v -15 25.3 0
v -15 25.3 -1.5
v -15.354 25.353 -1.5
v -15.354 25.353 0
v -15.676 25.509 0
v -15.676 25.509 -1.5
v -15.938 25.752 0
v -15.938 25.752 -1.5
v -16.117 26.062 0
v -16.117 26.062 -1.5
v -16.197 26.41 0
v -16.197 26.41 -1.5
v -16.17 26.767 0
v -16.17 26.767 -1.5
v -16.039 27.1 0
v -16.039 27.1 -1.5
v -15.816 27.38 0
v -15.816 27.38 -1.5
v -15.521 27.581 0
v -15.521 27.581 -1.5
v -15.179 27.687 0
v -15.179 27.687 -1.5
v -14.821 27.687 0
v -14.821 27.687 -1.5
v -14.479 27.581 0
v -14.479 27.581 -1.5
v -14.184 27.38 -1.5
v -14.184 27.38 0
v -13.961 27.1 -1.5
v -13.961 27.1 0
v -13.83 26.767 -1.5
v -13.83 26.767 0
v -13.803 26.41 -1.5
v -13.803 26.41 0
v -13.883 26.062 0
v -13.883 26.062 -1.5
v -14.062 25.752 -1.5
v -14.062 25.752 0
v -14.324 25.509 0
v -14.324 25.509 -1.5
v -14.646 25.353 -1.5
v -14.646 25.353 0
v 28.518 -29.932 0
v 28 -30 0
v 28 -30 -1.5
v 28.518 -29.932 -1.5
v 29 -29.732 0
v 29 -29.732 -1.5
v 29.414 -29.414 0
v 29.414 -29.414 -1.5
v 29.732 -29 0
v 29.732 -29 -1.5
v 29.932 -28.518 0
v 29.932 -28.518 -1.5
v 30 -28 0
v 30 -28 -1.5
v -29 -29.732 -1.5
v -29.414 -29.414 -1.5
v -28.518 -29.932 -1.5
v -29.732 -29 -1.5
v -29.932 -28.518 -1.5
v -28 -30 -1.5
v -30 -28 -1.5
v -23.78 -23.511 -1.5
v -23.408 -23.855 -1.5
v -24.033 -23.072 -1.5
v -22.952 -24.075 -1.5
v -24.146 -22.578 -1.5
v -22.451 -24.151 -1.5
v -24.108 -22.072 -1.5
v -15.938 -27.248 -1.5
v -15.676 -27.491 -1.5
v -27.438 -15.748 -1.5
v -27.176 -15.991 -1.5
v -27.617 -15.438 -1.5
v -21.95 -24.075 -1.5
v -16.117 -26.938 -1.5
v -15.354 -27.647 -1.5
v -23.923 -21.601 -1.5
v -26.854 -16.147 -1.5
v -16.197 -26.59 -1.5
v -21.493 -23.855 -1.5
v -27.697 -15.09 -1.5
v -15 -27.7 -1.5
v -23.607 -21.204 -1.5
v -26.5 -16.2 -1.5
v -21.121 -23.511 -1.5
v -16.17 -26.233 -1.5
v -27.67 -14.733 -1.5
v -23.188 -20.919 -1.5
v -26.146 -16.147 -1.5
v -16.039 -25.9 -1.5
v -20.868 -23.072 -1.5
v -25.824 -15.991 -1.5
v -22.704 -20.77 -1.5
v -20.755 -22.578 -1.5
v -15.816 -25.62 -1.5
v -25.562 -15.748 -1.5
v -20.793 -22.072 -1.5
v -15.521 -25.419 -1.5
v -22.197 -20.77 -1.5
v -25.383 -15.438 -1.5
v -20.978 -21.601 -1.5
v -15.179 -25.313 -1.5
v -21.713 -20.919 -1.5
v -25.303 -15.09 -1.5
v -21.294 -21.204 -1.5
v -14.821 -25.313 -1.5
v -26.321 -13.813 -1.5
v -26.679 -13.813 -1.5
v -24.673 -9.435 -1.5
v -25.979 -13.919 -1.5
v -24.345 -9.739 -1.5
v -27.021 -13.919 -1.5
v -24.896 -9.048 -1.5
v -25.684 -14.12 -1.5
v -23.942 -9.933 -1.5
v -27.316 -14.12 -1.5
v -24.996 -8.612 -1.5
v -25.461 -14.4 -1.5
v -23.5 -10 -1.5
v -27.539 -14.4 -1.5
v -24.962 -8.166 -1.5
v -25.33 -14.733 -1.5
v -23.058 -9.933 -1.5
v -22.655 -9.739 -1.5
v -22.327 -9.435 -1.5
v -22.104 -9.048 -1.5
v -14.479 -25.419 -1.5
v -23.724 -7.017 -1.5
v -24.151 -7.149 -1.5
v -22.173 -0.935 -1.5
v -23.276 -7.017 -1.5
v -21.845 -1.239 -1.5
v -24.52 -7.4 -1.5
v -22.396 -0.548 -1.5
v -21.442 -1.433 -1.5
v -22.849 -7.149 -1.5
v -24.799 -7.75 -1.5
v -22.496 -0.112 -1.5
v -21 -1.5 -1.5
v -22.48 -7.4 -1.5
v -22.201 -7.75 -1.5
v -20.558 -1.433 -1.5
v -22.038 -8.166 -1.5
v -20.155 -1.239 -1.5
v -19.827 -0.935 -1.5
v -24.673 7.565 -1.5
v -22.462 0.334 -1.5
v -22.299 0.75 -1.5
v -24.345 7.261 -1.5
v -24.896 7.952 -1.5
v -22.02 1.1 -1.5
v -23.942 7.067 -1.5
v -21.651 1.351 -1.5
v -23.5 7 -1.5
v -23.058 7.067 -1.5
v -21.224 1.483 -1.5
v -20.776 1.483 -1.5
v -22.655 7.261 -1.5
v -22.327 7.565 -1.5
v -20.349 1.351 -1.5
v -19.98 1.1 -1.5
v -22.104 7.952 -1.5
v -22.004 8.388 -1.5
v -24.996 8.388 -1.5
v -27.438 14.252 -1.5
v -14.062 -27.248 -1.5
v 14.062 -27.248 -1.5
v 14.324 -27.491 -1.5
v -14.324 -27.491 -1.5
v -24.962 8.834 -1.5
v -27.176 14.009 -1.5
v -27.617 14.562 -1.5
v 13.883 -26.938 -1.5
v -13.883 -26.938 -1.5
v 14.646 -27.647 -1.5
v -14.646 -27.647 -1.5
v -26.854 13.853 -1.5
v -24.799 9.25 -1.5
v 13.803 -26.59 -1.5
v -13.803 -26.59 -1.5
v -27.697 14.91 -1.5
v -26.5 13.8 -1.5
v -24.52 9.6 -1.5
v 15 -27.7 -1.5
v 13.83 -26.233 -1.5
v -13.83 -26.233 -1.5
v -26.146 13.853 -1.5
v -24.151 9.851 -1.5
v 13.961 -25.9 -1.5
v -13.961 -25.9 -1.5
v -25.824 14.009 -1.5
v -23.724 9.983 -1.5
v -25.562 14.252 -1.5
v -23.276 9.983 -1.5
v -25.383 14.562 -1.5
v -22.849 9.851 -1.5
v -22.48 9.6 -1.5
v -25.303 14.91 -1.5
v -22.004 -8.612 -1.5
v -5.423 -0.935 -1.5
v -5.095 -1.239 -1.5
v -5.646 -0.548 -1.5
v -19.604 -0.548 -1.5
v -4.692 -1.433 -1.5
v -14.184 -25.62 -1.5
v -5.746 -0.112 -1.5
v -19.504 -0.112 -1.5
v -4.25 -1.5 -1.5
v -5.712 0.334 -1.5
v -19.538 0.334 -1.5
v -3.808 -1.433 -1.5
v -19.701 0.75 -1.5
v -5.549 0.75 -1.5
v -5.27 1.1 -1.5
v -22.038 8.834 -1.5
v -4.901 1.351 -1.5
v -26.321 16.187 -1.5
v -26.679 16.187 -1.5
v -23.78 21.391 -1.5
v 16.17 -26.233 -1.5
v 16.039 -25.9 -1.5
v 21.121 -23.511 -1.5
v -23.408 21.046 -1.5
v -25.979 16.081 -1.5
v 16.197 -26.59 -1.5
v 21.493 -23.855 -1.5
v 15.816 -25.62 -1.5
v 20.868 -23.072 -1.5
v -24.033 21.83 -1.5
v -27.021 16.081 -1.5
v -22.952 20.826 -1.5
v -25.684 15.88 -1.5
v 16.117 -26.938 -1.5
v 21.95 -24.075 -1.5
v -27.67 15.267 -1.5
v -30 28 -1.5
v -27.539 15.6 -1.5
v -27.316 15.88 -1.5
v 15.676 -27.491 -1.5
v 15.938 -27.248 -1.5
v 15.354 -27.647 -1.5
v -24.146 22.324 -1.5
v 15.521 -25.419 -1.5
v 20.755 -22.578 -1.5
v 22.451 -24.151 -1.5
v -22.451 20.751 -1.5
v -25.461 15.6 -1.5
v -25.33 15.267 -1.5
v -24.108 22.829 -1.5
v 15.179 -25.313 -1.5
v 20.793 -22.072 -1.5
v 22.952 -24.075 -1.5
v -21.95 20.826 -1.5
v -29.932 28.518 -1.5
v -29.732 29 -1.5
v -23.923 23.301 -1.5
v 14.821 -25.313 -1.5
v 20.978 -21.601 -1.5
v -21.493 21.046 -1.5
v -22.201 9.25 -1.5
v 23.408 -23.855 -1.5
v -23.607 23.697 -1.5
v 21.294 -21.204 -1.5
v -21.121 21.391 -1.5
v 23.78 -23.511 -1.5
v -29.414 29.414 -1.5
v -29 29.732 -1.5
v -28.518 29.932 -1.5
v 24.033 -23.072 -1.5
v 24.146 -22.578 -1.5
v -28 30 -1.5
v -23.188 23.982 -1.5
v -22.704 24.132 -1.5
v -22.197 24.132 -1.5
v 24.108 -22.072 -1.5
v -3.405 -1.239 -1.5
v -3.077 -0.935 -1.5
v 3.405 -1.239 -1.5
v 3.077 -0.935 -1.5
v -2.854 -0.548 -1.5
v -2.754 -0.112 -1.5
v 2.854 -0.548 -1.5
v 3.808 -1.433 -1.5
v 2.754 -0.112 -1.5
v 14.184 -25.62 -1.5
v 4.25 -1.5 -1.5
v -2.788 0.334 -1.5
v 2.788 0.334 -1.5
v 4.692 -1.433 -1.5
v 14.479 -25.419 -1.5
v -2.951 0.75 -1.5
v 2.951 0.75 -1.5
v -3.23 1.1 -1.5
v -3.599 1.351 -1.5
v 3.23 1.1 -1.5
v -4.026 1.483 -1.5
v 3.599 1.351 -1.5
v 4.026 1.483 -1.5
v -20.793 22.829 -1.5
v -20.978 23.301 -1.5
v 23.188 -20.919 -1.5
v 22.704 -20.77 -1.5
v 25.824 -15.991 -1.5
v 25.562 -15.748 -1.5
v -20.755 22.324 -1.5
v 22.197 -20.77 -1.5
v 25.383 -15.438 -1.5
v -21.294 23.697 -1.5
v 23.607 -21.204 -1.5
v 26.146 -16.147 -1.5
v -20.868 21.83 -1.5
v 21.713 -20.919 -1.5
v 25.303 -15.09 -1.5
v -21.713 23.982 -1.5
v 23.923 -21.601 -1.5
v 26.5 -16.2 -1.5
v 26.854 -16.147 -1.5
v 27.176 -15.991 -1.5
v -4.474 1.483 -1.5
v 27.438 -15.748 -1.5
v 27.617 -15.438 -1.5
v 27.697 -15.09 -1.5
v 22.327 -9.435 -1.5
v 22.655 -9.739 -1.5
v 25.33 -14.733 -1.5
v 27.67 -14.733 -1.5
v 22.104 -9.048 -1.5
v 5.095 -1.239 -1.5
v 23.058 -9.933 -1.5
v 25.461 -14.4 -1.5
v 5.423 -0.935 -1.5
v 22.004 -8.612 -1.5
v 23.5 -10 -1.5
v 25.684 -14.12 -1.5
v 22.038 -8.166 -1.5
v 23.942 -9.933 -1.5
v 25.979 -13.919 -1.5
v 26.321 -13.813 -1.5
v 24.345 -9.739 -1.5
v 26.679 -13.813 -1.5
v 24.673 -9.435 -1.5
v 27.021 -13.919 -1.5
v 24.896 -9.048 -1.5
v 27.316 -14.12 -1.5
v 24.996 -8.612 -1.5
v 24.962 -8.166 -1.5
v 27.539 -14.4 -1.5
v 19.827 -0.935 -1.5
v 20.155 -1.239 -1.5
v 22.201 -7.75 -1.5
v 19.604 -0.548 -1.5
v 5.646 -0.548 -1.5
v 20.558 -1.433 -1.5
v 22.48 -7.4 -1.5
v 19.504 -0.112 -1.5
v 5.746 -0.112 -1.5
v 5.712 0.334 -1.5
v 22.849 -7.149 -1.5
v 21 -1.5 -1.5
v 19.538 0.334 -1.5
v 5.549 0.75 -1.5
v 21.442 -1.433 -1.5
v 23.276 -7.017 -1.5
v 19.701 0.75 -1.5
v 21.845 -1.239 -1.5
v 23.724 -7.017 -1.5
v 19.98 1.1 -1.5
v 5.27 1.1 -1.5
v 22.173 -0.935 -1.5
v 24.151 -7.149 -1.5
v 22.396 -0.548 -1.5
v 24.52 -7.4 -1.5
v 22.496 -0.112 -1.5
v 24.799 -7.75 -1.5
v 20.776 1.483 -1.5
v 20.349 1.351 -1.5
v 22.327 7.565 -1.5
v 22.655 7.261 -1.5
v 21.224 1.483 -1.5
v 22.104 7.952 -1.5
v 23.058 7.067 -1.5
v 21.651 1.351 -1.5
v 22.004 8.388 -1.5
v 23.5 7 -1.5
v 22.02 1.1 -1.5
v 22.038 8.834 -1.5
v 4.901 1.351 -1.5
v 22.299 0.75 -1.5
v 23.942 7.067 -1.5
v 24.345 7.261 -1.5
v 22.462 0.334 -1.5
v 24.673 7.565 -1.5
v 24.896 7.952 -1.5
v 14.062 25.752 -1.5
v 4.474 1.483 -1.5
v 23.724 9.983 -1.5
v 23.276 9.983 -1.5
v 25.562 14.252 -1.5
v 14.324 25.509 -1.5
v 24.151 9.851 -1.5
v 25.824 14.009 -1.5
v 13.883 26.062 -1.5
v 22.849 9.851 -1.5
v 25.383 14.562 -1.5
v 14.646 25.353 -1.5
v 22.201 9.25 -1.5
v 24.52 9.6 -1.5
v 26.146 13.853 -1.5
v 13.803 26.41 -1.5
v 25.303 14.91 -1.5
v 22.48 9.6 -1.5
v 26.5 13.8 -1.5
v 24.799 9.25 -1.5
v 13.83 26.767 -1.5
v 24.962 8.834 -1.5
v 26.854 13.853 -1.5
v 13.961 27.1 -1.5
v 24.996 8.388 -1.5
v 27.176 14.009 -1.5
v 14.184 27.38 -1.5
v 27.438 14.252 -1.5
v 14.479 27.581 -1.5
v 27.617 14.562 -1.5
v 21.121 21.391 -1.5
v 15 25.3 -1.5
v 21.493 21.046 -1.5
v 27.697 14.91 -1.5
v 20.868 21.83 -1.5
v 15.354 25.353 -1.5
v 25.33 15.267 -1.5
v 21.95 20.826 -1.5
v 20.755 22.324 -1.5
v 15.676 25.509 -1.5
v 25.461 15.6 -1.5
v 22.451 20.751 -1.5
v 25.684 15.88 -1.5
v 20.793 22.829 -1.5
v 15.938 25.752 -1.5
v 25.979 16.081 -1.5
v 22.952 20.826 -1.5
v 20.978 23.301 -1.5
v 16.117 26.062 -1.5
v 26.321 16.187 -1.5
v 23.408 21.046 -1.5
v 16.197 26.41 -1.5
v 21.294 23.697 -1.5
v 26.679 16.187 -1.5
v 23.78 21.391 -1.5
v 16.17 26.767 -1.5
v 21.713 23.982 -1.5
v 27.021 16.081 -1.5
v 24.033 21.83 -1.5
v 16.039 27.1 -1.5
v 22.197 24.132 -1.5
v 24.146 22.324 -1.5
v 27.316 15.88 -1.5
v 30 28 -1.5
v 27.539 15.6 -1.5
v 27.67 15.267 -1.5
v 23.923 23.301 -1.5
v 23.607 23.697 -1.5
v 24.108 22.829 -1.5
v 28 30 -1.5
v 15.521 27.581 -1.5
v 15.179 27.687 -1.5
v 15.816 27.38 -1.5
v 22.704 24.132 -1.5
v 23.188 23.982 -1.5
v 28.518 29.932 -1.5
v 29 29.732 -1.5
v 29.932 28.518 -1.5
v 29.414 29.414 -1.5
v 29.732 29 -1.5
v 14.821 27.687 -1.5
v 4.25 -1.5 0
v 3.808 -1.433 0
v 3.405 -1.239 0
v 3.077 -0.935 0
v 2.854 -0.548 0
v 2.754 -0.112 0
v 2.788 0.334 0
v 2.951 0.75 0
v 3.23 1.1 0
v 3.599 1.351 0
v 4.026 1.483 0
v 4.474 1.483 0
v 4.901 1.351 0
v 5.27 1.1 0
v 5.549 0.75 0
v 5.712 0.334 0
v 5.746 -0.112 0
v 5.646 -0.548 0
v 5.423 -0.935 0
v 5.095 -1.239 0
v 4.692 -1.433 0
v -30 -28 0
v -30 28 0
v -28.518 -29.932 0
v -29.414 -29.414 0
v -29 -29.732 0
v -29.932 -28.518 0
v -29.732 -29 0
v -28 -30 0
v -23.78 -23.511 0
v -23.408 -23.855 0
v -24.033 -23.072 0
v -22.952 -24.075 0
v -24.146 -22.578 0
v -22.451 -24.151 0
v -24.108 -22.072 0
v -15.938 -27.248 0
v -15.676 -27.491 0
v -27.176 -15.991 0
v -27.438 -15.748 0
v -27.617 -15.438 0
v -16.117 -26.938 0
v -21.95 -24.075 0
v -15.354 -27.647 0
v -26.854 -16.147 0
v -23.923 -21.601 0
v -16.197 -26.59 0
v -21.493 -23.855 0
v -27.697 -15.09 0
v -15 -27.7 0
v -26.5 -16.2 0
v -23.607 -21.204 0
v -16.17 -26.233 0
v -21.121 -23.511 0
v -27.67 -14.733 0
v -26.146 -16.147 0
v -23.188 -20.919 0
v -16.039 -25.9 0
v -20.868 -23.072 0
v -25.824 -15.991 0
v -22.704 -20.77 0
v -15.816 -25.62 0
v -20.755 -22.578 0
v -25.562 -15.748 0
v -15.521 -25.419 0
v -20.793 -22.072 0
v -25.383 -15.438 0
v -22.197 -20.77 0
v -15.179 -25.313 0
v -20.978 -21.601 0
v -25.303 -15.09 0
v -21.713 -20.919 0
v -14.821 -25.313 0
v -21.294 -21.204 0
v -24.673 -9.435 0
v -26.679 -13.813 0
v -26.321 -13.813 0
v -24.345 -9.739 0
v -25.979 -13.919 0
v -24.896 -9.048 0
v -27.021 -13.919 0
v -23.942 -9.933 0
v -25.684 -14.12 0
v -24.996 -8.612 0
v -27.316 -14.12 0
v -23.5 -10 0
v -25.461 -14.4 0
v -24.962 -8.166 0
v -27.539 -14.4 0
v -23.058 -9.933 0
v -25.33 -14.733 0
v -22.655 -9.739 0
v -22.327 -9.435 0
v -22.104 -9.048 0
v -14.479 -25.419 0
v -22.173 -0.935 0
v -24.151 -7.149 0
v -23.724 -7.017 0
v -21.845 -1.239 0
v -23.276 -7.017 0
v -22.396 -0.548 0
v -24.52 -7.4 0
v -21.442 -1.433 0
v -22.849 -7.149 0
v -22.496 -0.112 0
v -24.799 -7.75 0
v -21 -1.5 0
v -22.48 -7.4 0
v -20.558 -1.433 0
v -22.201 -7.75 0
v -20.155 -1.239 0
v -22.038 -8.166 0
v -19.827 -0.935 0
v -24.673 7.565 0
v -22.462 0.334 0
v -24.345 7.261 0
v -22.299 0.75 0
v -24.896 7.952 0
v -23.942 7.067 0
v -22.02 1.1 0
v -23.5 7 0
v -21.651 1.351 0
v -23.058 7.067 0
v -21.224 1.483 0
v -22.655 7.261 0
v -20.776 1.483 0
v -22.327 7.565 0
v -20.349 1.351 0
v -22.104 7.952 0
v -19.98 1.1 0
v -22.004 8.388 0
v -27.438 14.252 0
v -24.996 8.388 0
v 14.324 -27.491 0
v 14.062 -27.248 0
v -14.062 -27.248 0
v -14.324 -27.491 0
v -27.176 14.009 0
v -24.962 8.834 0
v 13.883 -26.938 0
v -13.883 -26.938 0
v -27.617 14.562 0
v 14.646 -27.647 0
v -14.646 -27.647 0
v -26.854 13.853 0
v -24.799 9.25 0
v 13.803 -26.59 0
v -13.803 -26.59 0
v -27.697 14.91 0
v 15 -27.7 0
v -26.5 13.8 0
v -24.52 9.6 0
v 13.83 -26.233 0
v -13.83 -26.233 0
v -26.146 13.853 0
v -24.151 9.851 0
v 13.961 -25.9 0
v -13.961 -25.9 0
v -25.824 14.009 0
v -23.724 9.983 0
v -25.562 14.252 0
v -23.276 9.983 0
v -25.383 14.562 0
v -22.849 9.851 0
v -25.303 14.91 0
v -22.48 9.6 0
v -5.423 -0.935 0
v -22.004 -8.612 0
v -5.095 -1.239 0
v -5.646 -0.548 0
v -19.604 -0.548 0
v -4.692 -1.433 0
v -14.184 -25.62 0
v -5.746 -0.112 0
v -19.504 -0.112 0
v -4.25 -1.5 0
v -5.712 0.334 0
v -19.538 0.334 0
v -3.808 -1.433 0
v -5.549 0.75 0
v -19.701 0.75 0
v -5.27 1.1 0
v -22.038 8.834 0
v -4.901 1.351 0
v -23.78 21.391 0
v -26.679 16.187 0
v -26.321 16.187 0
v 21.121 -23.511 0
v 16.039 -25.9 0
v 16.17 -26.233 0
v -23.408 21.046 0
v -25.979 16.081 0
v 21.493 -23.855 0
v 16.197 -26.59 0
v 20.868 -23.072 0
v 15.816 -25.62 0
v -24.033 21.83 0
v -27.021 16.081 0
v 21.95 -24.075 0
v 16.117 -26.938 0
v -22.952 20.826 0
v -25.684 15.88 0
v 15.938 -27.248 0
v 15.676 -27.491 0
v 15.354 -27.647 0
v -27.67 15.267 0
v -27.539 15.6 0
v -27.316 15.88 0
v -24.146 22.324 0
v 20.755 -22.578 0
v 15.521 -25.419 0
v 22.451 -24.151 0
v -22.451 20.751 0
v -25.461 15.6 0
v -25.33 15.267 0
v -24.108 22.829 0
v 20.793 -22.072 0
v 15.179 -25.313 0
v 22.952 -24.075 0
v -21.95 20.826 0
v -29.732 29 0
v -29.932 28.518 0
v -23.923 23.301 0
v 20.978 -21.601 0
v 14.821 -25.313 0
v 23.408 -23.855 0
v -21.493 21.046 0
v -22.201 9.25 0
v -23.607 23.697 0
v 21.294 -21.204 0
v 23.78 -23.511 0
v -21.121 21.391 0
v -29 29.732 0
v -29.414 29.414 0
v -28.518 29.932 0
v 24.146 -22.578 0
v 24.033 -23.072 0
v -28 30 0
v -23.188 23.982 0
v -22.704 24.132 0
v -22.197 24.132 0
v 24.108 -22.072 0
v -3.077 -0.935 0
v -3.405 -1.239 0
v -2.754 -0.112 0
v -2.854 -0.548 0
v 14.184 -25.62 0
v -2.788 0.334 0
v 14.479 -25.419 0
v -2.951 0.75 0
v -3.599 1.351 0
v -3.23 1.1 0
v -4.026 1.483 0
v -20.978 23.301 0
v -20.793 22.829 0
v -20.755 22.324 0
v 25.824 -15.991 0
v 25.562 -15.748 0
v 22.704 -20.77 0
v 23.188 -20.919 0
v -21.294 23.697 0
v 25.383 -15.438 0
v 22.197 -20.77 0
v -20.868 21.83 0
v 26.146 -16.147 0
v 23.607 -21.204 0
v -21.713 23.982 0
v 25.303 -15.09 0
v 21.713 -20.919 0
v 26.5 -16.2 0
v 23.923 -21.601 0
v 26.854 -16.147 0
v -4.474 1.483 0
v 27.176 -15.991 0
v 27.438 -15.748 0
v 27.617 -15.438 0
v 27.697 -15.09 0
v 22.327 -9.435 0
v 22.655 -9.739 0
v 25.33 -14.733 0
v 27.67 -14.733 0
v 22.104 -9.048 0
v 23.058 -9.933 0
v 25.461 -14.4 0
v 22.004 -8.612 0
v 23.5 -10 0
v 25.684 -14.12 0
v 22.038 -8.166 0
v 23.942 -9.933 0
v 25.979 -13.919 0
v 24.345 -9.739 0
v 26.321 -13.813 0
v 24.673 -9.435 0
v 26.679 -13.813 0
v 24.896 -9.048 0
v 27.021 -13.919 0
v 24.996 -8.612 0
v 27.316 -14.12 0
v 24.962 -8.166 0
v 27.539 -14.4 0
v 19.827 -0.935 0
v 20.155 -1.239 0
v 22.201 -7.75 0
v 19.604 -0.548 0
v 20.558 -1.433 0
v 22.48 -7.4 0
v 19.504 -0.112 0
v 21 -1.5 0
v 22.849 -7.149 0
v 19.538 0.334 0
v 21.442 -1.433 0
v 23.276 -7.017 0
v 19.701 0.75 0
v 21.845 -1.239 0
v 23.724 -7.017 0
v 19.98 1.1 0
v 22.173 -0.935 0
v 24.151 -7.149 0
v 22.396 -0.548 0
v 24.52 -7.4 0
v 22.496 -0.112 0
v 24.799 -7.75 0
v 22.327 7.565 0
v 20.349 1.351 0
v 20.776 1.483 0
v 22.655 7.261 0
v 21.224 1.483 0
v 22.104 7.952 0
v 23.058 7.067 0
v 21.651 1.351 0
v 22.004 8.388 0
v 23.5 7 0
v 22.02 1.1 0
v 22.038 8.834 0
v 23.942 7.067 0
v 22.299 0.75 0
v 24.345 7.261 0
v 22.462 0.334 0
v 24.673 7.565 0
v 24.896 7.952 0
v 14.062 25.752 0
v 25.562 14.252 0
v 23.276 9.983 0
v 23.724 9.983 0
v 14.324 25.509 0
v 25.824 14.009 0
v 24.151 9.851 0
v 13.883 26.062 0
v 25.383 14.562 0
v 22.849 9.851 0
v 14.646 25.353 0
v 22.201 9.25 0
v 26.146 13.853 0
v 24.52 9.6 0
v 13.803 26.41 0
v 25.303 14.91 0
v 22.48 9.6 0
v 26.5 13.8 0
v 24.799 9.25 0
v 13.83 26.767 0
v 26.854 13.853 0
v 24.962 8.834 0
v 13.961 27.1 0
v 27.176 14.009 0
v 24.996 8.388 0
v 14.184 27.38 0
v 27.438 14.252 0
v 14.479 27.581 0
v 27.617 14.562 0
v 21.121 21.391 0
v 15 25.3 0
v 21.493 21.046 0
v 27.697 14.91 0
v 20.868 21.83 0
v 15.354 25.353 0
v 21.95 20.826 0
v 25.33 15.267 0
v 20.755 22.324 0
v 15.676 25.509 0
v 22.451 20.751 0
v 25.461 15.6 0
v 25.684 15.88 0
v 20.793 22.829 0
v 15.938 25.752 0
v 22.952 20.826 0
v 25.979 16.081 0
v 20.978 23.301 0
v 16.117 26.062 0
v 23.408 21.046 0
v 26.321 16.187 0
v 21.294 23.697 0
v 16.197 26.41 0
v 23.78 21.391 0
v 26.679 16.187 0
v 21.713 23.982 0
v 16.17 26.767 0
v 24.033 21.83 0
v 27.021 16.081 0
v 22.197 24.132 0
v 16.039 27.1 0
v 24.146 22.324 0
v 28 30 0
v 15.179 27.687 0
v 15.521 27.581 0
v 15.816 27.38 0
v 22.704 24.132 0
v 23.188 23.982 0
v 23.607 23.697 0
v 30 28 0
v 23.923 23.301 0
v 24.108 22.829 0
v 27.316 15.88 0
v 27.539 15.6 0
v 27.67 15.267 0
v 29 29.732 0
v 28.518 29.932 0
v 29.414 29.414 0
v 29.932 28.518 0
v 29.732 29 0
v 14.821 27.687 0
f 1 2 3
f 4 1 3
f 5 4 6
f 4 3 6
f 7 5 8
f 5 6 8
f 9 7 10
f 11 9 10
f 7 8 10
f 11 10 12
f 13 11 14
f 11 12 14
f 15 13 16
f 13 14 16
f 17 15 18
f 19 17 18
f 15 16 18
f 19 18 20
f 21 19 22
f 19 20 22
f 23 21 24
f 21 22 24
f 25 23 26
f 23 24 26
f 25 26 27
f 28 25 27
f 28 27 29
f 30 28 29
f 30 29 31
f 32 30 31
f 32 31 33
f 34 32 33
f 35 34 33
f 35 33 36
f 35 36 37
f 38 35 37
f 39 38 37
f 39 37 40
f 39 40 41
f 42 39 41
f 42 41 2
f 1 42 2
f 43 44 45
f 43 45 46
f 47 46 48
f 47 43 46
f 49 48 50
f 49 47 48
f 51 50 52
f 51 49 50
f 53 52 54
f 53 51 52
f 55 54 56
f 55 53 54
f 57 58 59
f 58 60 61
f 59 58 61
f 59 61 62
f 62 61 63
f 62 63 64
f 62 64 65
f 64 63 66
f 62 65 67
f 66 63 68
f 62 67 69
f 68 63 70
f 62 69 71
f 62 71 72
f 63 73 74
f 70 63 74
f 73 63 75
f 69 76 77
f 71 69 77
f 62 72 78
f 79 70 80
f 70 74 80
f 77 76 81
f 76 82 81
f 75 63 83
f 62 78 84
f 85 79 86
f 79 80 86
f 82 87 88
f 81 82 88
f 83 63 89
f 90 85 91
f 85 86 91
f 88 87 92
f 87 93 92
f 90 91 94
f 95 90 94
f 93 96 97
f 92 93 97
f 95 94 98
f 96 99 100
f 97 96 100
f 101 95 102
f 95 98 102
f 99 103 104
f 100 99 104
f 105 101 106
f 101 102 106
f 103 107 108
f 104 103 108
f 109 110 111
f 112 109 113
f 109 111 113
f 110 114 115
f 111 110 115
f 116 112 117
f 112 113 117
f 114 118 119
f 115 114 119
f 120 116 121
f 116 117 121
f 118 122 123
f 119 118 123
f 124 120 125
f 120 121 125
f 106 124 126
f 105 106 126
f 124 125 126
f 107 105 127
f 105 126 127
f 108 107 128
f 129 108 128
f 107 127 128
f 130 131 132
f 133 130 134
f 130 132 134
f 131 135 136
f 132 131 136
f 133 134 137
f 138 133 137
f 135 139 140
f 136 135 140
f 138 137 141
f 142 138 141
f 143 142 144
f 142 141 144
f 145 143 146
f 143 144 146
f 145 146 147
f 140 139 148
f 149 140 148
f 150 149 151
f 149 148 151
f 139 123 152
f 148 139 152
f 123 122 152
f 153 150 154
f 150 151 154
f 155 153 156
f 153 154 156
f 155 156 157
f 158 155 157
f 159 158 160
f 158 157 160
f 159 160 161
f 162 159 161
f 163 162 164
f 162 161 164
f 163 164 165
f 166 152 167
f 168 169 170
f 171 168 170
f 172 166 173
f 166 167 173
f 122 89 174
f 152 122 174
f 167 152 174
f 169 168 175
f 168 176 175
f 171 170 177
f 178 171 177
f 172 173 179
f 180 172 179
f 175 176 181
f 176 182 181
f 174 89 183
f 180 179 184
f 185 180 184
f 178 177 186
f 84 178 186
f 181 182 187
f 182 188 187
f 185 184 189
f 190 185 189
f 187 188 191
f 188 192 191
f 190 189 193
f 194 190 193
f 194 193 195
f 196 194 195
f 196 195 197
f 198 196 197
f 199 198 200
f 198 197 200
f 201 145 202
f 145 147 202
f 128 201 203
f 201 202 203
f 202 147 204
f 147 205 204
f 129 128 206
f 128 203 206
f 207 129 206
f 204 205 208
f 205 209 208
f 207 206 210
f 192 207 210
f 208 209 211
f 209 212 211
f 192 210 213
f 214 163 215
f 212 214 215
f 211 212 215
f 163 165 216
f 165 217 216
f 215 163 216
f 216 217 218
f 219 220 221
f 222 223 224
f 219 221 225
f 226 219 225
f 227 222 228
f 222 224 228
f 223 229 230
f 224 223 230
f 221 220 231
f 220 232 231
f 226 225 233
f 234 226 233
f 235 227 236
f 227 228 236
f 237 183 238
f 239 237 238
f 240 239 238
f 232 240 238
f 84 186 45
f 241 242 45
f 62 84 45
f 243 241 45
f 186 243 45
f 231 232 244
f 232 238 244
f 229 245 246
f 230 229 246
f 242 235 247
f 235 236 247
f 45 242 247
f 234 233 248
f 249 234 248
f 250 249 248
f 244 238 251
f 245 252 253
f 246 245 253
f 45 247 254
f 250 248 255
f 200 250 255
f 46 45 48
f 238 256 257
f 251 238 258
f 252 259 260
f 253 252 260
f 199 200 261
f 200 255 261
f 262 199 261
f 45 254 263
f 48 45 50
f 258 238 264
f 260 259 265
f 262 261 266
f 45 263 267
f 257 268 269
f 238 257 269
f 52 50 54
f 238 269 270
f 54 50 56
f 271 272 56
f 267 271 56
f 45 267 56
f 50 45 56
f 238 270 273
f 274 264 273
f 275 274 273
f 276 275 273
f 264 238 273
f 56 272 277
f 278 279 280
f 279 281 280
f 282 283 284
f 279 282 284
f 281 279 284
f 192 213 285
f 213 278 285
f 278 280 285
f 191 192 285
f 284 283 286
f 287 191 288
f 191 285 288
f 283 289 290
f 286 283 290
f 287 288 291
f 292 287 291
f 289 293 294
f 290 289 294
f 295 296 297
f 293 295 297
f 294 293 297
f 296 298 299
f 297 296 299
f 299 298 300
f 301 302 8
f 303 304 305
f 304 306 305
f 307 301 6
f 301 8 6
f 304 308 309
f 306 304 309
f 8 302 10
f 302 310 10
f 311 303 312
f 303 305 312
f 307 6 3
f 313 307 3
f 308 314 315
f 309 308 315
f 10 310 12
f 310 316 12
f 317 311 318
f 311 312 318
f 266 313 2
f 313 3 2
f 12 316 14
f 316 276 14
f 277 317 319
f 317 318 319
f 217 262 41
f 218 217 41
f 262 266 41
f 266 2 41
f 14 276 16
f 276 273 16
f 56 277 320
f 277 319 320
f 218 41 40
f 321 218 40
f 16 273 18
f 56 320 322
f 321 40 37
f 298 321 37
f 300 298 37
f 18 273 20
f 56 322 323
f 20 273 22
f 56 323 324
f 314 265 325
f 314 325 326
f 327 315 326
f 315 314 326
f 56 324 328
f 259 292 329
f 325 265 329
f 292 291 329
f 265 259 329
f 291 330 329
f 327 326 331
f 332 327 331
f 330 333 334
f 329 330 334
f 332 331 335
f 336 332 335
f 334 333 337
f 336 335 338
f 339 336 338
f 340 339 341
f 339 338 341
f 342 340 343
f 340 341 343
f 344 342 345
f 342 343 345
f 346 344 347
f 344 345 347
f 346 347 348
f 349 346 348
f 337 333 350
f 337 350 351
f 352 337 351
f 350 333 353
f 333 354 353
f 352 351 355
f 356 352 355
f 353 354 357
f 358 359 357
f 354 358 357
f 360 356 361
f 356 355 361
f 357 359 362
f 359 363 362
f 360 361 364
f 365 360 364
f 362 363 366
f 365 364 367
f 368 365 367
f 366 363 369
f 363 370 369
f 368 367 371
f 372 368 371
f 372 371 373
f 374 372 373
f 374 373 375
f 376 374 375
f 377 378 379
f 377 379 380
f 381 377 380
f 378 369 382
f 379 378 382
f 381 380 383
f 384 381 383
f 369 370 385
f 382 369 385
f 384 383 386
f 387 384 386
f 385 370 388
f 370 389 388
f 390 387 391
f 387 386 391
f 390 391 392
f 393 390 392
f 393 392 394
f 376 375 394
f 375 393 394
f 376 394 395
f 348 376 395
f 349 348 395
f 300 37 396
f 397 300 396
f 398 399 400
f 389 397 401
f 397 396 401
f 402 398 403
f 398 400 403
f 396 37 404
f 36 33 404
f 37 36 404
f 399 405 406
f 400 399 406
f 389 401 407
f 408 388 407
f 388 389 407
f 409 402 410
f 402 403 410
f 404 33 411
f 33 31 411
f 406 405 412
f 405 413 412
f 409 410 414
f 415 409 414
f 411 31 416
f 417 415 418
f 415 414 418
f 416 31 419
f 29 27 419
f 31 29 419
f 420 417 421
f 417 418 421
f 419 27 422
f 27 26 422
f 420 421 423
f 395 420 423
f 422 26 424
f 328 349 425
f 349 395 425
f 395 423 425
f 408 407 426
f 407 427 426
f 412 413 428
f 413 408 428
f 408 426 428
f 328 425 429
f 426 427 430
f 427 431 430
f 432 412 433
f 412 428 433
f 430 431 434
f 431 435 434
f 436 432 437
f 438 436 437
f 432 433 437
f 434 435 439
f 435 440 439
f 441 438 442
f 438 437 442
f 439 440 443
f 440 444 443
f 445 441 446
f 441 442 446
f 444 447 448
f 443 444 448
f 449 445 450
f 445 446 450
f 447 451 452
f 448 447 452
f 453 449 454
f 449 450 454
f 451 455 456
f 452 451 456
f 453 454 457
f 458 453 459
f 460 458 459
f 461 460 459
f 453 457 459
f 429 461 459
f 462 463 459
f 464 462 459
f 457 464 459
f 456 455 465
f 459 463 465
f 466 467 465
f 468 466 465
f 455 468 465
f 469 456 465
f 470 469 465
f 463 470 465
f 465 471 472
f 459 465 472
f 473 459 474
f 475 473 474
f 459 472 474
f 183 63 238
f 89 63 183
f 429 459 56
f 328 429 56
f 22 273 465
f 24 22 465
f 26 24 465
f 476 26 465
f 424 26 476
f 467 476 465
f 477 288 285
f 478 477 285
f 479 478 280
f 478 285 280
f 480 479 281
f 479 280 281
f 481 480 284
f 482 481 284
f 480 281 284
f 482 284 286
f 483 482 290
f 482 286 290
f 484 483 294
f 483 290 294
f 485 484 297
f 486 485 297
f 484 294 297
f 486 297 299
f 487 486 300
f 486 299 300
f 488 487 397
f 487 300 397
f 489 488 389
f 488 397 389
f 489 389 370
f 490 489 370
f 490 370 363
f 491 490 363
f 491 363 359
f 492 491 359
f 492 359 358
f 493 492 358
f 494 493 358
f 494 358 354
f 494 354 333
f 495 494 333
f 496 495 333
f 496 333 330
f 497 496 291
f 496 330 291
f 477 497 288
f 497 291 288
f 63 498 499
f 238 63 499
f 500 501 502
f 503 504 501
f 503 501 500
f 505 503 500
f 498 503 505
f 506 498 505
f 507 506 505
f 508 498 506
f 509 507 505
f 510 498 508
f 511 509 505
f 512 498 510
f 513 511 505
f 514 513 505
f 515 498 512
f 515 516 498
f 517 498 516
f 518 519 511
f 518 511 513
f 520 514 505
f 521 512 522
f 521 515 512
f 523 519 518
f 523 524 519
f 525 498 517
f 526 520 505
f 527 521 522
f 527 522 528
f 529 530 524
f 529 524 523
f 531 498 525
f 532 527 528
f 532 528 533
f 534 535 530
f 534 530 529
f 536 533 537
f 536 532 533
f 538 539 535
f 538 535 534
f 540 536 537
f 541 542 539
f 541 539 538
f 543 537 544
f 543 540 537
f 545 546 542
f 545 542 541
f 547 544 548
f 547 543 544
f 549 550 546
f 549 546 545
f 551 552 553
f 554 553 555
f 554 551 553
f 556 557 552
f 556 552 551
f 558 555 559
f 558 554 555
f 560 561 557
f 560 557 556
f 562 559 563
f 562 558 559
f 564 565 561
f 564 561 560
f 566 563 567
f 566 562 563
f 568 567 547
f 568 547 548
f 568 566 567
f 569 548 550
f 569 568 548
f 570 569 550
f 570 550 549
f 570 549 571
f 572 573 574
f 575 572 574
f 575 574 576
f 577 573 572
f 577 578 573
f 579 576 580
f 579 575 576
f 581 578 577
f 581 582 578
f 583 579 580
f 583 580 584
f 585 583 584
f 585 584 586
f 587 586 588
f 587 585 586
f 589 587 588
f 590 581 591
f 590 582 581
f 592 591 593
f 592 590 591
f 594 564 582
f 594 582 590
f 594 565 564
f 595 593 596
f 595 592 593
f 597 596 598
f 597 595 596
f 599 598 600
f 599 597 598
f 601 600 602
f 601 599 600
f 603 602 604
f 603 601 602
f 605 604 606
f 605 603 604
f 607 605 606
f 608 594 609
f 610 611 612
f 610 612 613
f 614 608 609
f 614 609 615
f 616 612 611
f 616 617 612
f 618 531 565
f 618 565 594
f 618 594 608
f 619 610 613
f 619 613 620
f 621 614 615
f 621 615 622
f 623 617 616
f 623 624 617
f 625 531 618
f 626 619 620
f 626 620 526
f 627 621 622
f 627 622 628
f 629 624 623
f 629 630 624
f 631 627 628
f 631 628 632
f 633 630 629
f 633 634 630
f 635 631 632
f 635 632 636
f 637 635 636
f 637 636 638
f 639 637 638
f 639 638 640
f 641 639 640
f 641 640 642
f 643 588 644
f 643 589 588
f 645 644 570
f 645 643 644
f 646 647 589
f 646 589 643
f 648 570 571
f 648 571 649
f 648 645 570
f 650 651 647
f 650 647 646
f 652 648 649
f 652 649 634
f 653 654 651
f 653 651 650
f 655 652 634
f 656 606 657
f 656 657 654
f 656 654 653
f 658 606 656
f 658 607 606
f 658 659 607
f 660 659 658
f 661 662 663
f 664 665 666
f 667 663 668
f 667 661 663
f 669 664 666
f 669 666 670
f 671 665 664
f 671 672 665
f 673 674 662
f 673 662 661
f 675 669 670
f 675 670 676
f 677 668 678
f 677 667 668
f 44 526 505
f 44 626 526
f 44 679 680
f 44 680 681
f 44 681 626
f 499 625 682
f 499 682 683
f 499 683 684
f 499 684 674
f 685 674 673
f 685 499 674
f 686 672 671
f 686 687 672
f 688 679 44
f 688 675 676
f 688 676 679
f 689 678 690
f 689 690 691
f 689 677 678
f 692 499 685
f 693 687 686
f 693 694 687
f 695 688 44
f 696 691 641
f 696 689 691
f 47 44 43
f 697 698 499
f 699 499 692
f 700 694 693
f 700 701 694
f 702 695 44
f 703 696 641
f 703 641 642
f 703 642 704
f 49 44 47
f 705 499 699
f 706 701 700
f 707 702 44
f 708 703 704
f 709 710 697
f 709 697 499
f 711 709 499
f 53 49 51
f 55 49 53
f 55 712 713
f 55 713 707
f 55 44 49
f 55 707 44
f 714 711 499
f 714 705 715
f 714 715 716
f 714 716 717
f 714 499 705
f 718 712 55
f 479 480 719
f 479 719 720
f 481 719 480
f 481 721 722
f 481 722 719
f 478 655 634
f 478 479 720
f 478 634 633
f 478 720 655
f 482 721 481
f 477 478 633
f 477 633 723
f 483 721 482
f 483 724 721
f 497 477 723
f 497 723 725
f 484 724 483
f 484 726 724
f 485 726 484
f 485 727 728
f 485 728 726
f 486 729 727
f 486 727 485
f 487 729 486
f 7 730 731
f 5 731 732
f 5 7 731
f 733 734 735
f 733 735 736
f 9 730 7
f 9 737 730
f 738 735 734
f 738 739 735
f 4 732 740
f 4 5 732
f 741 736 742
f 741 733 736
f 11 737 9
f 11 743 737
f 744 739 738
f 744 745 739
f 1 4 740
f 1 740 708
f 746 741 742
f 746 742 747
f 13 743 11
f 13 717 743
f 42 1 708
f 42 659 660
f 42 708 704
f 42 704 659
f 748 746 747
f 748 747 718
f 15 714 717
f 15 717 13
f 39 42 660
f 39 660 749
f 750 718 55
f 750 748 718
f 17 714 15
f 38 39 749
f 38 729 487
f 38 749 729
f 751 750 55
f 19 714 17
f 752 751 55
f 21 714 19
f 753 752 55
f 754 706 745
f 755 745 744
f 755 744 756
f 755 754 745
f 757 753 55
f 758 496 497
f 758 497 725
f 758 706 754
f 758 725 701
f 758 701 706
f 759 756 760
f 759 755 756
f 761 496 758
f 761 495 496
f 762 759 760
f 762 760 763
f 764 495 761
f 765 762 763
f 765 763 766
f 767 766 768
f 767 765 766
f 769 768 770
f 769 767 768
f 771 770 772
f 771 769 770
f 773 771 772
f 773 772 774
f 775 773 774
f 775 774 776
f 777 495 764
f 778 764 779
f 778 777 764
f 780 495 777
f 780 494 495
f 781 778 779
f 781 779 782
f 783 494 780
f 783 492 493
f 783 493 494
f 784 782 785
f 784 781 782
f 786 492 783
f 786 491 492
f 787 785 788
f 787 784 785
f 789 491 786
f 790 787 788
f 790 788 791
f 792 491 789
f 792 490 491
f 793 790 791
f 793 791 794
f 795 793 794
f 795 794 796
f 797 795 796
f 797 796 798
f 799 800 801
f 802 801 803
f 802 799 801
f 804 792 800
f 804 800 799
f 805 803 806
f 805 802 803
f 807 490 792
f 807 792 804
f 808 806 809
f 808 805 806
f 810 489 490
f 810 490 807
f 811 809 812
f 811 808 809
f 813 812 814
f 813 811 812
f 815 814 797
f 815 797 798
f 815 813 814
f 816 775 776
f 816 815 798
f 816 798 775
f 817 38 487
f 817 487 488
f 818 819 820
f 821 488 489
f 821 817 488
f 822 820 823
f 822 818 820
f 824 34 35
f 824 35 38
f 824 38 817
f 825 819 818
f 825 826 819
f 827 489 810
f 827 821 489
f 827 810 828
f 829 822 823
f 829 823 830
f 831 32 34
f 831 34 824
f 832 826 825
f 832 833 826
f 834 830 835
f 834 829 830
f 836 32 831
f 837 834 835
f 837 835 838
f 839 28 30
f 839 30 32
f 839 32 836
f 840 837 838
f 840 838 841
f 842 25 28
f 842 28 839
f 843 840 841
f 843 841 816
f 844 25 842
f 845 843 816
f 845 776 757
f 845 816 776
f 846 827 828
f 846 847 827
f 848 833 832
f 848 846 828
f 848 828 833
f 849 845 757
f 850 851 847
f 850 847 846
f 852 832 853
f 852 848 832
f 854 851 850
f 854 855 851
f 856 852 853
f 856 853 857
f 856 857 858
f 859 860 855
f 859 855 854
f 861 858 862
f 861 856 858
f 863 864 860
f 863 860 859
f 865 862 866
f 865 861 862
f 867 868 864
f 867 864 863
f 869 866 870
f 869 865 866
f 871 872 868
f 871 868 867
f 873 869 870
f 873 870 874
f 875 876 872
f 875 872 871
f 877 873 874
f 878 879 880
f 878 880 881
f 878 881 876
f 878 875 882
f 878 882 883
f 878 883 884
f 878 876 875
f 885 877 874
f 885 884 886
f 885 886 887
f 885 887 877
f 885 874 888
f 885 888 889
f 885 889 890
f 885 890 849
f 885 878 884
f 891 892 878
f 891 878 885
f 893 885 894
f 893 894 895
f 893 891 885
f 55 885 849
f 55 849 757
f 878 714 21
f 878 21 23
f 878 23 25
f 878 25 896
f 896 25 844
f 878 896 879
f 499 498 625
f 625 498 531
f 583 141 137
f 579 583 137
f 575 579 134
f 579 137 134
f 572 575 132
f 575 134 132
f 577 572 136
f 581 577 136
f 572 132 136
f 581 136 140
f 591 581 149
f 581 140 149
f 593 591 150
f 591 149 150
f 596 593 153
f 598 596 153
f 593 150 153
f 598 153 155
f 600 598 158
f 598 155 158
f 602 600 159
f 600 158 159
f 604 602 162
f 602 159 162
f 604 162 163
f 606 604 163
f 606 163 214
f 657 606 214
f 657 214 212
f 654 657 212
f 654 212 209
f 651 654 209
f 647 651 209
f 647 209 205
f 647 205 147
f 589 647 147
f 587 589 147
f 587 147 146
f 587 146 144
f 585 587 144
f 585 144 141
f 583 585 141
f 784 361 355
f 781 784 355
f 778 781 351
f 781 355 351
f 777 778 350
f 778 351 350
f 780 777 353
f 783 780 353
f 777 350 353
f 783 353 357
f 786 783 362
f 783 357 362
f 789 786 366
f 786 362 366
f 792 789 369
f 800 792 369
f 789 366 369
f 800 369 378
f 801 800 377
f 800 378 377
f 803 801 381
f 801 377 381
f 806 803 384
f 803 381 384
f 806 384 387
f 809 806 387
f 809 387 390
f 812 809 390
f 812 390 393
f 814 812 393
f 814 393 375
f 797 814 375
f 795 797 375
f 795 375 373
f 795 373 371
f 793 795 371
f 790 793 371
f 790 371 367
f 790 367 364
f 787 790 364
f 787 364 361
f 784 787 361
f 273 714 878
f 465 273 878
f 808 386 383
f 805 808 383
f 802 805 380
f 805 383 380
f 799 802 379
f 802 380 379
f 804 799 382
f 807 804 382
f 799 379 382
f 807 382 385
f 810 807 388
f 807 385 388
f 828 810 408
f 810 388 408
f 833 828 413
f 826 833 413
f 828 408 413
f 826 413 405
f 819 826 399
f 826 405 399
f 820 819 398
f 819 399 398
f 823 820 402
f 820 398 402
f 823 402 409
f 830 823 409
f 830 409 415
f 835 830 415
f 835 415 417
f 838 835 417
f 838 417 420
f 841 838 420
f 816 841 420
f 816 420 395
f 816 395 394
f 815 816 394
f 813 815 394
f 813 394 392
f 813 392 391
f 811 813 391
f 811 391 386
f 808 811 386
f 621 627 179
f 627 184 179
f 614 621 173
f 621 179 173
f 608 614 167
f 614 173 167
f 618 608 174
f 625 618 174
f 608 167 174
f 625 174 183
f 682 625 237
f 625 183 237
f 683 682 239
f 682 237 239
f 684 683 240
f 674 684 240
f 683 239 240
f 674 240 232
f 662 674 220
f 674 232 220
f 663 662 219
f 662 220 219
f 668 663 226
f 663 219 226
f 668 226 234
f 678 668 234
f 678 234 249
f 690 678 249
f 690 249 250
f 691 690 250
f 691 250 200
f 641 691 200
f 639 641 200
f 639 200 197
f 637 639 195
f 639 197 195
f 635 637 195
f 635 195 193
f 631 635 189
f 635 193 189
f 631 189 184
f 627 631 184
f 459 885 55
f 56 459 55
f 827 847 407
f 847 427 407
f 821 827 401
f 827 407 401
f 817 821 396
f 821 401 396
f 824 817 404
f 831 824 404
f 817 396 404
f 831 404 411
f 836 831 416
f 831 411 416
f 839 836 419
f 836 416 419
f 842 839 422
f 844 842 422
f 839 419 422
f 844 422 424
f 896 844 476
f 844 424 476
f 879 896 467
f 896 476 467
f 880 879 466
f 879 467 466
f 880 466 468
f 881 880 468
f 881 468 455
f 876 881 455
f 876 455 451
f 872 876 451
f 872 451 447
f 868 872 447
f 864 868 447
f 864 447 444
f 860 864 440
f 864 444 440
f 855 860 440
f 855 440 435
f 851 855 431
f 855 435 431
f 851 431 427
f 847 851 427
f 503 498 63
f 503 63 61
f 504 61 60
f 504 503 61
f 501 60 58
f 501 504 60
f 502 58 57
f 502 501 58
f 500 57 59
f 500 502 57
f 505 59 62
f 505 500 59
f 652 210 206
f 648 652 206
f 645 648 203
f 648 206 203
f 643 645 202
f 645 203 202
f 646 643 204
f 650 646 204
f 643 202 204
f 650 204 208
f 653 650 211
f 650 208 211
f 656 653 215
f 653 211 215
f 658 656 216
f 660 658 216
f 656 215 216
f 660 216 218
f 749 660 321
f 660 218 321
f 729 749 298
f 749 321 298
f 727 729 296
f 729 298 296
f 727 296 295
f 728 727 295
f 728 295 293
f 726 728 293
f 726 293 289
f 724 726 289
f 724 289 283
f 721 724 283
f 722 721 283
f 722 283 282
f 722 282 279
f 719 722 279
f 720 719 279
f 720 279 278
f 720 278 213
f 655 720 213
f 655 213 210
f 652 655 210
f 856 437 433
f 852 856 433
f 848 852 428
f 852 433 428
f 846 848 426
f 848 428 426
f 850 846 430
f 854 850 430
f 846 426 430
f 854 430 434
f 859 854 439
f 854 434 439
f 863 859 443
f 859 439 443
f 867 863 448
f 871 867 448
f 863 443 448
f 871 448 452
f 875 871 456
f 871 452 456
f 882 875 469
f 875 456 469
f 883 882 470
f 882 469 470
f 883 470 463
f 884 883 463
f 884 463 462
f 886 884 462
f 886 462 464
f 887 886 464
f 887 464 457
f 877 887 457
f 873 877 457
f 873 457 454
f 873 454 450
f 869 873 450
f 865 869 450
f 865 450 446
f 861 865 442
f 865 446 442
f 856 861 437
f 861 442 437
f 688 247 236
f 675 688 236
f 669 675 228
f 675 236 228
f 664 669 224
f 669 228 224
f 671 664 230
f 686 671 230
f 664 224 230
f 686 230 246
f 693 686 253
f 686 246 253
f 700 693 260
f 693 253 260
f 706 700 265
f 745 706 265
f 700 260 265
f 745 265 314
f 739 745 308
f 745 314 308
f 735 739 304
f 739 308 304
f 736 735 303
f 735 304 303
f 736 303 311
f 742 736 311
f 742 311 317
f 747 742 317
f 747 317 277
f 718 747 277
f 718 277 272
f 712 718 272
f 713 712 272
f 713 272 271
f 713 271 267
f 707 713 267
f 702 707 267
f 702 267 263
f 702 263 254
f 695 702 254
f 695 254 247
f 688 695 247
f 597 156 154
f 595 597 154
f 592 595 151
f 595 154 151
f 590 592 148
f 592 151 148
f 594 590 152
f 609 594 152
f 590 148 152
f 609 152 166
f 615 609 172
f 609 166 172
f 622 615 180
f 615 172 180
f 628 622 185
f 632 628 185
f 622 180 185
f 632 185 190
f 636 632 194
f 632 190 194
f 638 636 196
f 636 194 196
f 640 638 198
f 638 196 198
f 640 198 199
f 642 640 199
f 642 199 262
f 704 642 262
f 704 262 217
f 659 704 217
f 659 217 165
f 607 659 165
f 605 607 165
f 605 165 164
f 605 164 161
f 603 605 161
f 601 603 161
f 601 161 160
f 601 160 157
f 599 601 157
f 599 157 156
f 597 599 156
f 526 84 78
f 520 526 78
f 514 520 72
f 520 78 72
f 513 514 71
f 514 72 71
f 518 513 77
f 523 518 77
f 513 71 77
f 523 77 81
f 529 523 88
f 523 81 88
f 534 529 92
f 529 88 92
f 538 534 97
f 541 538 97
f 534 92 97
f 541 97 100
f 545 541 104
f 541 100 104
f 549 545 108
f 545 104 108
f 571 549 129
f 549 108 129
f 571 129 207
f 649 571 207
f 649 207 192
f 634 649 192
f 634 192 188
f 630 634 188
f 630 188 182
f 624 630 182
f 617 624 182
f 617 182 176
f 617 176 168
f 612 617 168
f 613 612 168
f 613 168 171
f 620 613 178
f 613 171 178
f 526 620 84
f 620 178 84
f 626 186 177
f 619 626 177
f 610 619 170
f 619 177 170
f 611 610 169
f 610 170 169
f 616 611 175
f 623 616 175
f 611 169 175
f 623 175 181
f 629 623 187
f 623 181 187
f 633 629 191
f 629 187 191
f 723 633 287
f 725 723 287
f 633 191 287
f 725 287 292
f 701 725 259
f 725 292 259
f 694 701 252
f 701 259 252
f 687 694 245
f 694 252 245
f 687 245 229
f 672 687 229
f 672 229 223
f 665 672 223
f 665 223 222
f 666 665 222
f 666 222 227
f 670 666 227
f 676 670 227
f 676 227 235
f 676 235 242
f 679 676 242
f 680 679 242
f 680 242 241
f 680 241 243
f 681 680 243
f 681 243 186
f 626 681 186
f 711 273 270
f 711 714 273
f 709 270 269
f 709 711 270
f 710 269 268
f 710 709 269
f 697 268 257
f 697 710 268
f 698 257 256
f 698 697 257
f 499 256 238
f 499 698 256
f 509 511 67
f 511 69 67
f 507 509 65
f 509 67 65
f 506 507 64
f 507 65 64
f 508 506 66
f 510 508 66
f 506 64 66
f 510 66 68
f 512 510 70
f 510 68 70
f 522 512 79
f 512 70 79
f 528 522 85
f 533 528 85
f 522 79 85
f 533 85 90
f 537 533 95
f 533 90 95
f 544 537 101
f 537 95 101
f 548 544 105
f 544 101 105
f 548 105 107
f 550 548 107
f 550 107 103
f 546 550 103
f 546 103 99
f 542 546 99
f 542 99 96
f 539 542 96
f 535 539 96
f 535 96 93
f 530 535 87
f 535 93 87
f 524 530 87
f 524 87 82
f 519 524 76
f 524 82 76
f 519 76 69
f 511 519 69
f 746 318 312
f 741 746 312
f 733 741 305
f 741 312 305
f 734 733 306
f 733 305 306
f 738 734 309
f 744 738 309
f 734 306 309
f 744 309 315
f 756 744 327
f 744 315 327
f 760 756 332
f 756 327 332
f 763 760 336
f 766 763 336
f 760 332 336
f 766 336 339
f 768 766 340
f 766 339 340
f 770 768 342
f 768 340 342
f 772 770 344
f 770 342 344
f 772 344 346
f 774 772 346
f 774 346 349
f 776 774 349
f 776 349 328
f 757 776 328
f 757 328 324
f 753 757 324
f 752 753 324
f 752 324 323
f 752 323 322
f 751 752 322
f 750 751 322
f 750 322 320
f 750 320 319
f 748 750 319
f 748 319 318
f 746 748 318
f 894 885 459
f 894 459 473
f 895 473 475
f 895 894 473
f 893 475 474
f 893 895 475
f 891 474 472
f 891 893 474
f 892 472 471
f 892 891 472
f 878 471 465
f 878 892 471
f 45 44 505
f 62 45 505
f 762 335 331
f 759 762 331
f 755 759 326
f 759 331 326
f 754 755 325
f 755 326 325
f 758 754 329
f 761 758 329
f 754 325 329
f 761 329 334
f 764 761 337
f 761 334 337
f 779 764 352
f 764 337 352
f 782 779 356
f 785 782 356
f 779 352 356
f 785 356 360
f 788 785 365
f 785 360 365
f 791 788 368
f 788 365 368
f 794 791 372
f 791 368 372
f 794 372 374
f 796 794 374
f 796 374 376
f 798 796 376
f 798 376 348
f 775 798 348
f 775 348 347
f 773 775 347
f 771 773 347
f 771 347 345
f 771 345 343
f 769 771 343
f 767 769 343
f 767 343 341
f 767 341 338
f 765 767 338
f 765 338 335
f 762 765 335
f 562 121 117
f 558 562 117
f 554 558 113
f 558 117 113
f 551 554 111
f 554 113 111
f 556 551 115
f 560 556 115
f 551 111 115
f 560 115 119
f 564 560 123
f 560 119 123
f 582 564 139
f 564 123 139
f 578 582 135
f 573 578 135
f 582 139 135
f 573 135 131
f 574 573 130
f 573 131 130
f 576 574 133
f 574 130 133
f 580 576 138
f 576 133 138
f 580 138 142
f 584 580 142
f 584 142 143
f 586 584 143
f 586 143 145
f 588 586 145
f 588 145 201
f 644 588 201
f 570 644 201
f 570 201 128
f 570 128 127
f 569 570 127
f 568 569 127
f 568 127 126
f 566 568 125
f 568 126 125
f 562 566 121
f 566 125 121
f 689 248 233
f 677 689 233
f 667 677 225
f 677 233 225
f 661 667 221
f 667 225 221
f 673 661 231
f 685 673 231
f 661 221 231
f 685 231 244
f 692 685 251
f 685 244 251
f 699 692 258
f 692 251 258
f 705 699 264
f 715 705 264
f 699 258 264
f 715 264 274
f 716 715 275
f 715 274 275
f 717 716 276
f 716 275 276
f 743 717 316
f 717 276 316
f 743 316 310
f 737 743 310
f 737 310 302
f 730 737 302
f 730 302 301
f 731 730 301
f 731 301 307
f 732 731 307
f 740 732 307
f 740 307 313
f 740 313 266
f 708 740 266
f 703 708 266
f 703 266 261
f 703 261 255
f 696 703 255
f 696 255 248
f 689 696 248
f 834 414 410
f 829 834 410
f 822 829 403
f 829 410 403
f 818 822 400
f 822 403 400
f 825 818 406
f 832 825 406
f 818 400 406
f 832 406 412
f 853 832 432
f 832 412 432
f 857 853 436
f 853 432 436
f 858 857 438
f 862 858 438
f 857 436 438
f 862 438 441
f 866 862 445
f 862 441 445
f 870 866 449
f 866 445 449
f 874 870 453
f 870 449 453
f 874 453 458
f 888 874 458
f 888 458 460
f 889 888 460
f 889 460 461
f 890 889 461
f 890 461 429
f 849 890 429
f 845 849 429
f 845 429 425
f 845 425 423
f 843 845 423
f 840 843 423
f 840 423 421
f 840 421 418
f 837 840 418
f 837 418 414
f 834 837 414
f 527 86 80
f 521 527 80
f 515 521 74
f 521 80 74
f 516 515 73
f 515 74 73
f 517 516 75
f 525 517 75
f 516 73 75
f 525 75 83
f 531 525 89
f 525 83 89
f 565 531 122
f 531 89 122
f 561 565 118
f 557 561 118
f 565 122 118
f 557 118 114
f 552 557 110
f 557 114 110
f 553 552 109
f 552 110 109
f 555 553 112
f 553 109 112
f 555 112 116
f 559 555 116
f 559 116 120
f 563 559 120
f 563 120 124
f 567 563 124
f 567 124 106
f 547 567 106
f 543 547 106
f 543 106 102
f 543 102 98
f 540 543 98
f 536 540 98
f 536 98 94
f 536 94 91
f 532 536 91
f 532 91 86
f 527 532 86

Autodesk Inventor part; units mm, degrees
ref_plane "YZ Plane" through (0, 0, 0) normal (1, 0, 0) x (0, 1, 0)
ref_plane "XZ Plane" through (0, 0, 0) normal (0, 1, 0) x (-1, 0, 0)
ref_plane "XY Plane" through (0, 0, 0) normal (0, 0, 1) x (1, 0, 0)
sketch "Sketch1" plane through (0, 0, 0) normal (0, 0, 1) x (1, 0, 0)
  line L0 (0, -42.5799) -> (0, 42.5799) projected
  line L1 (-42.5799, 0) -> (42.5799, 0) projected
  line L2 (-28, 30) -> (28, 30)
  line L3 (30, 28) -> (30, -28)
  line L4 (28, -30) -> (-28, -30)
  line L5 (-30, -28) -> (-30, 28)
  arc A0 (-28, 30) -> (-30, 28) centre (-28, 28) ccw
  arc A1 (30, 28) -> (28, 30) centre (28, 28) ccw
  arc A2 (28, -30) -> (30, -28) centre (28, -28) ccw
  arc A3 (-30, -28) -> (-28, -30) centre (-28, -28) ccw
  point P0 (0, 0)
  point P1 (-30, 30)
  point P2 (30, 30)
  point P3 (-22.4506, 22.4506)
  point P4 (-26.5, 15)
  point P5 (-15, 26.5)
  point P6 (-15, -26.5)
  point P7 (-22.4506, -22.4506)
  point P8 (-26.5, -15)
  point P9 (26.5, -15)
  point P10 (22.4506, -22.4506)
  point P11 (15, -26.5)
  point P12 (15, 26.5)
  point P13 (22.4506, 22.4506)
  point P14 (26.5, 15)
  point P15 (-21, 0)
  point P16 (21, 0)
  point P17 (-4.25, 0)
  point P18 (4.25, 0)
  point P19 (-23.5, 8.5)
  point P20 (-23.5, -8.5)
  point P21 (23.5, 8.5)
  point P22 (23.5, -8.5)
  dimension "d0" = 60
  dimension "d1" = 2
  dimension "d2" = 22.4506
  dimension "d3" = 22.4506
  dimension "d4" = 15
  dimension "d5" = 15
  dimension "d6" = 3.5
  dimension "d7" = 3.5
  dimension "d10" = 360
  dimension "d28" = 9
  dimension "d36" = 25.75
  dimension "d48" = 19.25
  dimension "d49" = 8.5
extrude "Extrusion1" add sketch "Sketch1" against normal blind 1.5
hole "Hole1" at (-22.4506, 22.4506, 0) at (22.4506, 22.4506, 0) at (22.4506, -22.4506, 0) at (-22.4506, -22.4506, 0) direction (0, 0, -1) diameter 3.4 end through all clearance for "Countersunk Flat Head Screw DIN EN ISO 2009" size "M3" standard "DIN"
hole "Hole2" at (-26.5, 15, 0) at (-15, 26.5, 0) at (-15, -26.5, 0) at (-26.5, -15, 0) at (26.5, -15, 0) at (15, -26.5, 0) at (15, 26.5, 0) at (26.5, 15, 0) direction (0, 0, -1) diameter 2.4 end through all clearance for "Countersunk Flat Head Screw DIN EN ISO 2009" size "M2" standard "DIN"
hole "Hole3" at (-21, 0, 0) at (21, 0, 0) direction (0, 0, -1) diameter 3 end through all
hole "Hole4" at (-4.25, 0, 0) at (4.25, 0, 0) at (-23.5, -8.5, 0) at (-23.5, 8.5, 0) at (23.5, 8.5, 0) at (23.5, -8.5, 0) direction (0, 0, -1) diameter 3 end through all
equation "\"d0\" = backplate_width"
equation "\"d2\" = hole_distance"
equation "\"d3\" = hole_distance"
equation "\"d4\" = screw_distance_center"
equation "\"d5\" = screw_distance_center"
equation "\"d6\" = screw_distance_outside"
equation "\"d7\" = screw_distance_outside"
equation "\"encoder_axis\" = 8"
equation "\"encoder_emboss\" = 0"
equation "\"encoders\" = 0"
equation "\"encoder_width\" = 27"
equation "\"front_plate_thickness\" = 2"
equation "\"glass_thickness\" = 2"
equation "\"screw_distance_outside\" = 3.5"
equation "\"encoder_rad\" = 49"
equation "\"encoder_extrude_hight\" = 3"
equation "\"screw_distance_center\" = 15"
equation "\"ring_top_thickness\" = 2"
equation "\"ring_outer_bevel_depth\" = 0.5"
equation "\"ring_depth\" = 6"
equation "\"ring_outer_bevel_height\" = 3"
equation "\"ring_inner_bevel_depth\" = 3.5"
equation "\"ring_thickness\" = 9"
equation "\"hole_from_center\" = 63.5"
equation "\"circle_dimension_inner\" = 47"
equation "\"circle_dimension\" = 56"
equation "\"backplate_width\" = 60"
equation "\"hole_distance\" = 22.45064"
properties part number "pcb_board" material "ABS Plastic"
